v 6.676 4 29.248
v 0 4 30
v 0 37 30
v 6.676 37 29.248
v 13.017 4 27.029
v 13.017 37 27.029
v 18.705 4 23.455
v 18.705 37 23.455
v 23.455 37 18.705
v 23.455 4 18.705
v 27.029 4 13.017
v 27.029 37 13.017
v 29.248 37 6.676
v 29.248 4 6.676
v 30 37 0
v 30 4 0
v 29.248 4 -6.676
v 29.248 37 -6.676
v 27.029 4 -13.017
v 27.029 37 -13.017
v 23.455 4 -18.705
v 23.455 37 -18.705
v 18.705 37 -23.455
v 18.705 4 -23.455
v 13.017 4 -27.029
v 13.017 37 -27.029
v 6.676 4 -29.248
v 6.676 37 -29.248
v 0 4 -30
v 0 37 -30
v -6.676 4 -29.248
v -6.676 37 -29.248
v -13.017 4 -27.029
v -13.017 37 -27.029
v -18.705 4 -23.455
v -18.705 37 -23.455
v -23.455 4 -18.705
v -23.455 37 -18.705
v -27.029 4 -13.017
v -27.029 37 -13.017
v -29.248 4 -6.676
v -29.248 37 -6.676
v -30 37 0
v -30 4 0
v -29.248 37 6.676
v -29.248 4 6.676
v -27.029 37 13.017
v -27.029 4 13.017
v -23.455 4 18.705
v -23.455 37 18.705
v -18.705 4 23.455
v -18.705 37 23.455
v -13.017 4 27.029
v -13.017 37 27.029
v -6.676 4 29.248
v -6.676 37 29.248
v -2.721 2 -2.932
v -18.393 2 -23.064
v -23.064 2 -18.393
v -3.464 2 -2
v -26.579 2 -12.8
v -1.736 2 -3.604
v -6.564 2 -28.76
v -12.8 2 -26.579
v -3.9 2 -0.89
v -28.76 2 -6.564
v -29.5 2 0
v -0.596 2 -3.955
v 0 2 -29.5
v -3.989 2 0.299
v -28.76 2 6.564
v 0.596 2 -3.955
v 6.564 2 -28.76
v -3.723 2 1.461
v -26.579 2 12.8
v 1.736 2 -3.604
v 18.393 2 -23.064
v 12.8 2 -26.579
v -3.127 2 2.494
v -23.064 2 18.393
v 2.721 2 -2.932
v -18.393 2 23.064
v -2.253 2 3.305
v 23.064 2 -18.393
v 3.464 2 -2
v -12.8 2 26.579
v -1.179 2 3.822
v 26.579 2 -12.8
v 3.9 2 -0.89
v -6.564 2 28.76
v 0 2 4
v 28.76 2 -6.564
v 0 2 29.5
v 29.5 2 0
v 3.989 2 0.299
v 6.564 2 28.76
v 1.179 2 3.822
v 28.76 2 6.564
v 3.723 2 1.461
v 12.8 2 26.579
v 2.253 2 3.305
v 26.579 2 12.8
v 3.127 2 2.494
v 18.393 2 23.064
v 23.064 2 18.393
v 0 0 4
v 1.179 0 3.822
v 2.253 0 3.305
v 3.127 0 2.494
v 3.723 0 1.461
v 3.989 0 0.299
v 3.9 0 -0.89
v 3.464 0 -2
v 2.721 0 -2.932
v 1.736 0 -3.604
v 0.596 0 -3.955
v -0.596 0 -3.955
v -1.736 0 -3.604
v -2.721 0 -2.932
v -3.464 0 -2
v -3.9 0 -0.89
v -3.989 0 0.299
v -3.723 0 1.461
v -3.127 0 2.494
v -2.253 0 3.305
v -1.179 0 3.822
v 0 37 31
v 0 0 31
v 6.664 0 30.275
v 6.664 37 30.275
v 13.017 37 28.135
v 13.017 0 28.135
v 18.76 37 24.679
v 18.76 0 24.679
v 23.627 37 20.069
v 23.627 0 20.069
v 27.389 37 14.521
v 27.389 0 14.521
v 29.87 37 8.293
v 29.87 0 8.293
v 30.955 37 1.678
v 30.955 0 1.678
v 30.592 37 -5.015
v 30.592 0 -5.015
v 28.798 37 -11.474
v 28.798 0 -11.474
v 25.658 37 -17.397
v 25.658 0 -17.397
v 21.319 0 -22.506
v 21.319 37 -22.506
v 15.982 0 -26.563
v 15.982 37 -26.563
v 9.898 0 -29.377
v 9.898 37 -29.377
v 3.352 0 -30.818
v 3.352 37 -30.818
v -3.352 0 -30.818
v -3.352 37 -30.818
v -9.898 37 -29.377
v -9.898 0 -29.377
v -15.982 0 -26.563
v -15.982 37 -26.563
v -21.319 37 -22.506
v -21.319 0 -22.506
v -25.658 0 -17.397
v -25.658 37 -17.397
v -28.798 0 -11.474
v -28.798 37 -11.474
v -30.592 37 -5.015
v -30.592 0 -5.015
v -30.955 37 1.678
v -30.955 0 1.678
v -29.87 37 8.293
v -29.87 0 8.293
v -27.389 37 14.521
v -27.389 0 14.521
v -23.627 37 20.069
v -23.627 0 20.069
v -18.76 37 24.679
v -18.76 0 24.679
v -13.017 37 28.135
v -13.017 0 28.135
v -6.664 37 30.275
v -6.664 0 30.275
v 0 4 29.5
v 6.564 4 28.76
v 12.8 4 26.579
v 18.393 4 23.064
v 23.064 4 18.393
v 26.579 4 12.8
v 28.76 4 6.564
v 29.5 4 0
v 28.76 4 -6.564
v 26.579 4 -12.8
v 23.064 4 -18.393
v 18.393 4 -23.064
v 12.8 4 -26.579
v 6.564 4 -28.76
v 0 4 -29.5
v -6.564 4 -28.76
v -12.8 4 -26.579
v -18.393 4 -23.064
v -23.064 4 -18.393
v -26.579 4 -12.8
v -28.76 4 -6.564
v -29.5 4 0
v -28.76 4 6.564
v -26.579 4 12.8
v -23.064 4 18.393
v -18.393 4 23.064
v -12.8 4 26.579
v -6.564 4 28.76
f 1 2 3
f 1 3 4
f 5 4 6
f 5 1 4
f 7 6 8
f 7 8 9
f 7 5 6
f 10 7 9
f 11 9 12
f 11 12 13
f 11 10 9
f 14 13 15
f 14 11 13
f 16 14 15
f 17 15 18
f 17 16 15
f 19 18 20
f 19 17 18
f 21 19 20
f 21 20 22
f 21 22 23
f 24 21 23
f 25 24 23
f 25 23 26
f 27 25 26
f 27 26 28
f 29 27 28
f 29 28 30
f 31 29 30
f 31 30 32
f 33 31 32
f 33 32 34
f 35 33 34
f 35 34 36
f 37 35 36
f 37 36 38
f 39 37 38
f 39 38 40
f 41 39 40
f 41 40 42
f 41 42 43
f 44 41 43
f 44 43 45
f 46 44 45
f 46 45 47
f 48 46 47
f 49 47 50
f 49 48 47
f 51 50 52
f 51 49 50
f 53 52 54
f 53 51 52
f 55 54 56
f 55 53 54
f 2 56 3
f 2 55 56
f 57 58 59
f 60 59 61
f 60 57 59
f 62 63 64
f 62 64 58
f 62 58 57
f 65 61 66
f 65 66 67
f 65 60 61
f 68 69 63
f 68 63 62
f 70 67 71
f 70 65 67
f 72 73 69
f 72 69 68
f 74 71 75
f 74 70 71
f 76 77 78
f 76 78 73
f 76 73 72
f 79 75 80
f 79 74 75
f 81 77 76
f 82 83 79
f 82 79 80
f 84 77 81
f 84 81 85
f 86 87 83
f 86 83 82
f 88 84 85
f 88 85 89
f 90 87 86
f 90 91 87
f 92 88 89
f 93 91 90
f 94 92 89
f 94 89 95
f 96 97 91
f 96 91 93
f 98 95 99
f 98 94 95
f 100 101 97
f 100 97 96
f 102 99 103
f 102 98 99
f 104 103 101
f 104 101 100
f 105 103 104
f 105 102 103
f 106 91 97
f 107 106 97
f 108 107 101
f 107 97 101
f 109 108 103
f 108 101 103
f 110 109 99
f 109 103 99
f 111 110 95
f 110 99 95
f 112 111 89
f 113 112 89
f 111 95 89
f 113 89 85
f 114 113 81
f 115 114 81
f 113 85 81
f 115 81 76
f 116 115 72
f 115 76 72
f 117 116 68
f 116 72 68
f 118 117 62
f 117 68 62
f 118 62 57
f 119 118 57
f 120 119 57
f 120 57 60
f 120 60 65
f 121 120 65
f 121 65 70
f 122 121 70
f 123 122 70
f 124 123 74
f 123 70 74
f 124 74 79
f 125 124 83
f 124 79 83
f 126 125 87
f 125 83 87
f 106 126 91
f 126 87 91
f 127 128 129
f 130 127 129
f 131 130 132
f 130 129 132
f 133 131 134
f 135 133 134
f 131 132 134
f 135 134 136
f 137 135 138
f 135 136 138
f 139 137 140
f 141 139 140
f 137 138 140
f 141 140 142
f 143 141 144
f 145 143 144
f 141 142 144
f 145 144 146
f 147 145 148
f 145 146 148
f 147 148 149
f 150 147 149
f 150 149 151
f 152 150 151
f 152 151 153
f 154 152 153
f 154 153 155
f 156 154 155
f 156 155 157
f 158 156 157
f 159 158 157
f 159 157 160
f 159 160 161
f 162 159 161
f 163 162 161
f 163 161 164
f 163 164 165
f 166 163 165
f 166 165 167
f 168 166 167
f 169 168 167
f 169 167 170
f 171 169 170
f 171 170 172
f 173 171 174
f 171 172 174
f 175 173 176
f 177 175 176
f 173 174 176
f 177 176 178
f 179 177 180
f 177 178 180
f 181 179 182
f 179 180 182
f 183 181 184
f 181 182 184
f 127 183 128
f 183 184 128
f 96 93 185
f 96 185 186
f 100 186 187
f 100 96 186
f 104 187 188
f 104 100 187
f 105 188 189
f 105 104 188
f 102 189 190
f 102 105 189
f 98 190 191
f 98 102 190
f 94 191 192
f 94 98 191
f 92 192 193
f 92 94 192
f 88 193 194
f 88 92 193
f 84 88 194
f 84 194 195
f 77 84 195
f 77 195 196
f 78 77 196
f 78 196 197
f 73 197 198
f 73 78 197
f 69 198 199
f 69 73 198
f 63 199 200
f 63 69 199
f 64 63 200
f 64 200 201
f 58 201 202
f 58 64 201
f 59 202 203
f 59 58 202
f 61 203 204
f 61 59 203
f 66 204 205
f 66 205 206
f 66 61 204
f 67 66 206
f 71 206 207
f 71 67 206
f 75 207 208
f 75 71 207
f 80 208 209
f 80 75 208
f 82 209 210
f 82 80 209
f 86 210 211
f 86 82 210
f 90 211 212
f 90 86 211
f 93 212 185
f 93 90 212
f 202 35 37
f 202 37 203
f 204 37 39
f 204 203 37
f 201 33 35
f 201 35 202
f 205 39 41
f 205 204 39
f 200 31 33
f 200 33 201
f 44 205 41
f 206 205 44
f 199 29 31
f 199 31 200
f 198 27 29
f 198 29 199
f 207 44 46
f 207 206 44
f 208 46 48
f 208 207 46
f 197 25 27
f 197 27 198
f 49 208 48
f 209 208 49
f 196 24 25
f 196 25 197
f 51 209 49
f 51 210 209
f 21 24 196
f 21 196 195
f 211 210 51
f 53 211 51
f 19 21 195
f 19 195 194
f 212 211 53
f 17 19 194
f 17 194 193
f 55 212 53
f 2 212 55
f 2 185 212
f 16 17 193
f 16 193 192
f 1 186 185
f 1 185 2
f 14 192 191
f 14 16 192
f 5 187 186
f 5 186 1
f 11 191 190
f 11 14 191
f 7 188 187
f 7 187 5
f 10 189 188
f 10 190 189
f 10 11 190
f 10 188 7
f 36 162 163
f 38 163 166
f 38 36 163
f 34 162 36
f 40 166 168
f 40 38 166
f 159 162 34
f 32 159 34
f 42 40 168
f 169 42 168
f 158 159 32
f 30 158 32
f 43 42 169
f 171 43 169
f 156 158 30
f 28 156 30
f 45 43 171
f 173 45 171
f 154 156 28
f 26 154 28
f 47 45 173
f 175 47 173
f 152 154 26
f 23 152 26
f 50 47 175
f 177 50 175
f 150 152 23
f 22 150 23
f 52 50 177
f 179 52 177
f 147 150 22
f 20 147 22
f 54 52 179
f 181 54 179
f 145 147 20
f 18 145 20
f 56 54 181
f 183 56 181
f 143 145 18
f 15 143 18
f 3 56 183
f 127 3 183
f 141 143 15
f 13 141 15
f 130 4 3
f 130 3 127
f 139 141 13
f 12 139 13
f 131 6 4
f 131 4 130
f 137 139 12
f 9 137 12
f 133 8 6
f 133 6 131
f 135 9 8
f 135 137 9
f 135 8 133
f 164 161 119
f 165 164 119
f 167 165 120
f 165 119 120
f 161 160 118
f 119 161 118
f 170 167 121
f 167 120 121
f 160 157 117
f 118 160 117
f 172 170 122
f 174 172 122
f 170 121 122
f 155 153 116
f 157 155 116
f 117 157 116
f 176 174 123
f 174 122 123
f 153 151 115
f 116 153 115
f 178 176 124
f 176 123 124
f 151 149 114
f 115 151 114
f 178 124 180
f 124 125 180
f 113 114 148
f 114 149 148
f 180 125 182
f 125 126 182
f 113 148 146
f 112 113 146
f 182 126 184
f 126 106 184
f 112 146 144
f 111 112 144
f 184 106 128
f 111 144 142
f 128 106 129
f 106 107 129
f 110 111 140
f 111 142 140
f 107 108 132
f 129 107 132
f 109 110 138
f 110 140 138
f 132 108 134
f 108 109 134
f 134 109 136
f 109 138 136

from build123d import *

# Parameters (mm, degrees)
SKETCH1_R           = 31
SKETCH1_R_2         = 30
BOSS_EXTRUDE1_DEPTH = 37
SKETCH2_R           = 31
BOSS_EXTRUDE2_DEPTH = 2
SKETCH5_R           = 30
SKETCH5_R_2         = 29.5
BOSS_EXTRUDE4_DEPTH = 2
SKETCH6_R           = 4
CUT_EXTRUDE1_DEPTH  = 2


with BuildPart() as part:
    # Sketch1 → Boss-Extrude1 (new body)
    with BuildSketch(Plane(origin=(0, 0, 0), x_dir=(1, 0, 0), z_dir=(0, 1, 0))):
        with Locations(Location((0, 0, 0), (0, 0, 270))):
            Circle(SKETCH1_R)
        with Locations(Location((0, 0, 0), (0, 0, 270))):
            Circle(SKETCH1_R_2, mode=Mode.SUBTRACT)
    extrude(amount=BOSS_EXTRUDE1_DEPTH)

    # Sketch2 → Boss-Extrude2 (add)
    with BuildSketch(Plane(origin=(0, 0, 0), x_dir=(1, 0, 0), z_dir=(0, 1, 0))):
        with Locations(Location((0, 0, 0), (0, 0, 270))):
            Circle(SKETCH2_R)
    extrude(amount=BOSS_EXTRUDE2_DEPTH)

    # Sketch5 → Boss-Extrude4 (add)
    with BuildSketch(Plane(origin=(0, 2, 0), x_dir=(1, 0, 0), z_dir=(0, 1, 0))):
        with Locations(Location((0, 0, 0), (0, 0, 270))):
            Circle(SKETCH5_R)
        with Locations(Location((0, 0, 0), (0, 0, 270))):
            Circle(SKETCH5_R_2, mode=Mode.SUBTRACT)
    extrude(amount=BOSS_EXTRUDE4_DEPTH)

    # Sketch6 → Cut-Extrude1 (cut)
    with BuildSketch(Plane(origin=(0, 2, 0), x_dir=(1, 0, 0), z_dir=(0, 1, 0))):
        with Locations(Location((0, 0, 0), (0, 0, 270))):
            Circle(SKETCH6_R)
    extrude(amount=-CUT_EXTRUDE1_DEPTH, mode=Mode.SUBTRACT)


solid = part.part
